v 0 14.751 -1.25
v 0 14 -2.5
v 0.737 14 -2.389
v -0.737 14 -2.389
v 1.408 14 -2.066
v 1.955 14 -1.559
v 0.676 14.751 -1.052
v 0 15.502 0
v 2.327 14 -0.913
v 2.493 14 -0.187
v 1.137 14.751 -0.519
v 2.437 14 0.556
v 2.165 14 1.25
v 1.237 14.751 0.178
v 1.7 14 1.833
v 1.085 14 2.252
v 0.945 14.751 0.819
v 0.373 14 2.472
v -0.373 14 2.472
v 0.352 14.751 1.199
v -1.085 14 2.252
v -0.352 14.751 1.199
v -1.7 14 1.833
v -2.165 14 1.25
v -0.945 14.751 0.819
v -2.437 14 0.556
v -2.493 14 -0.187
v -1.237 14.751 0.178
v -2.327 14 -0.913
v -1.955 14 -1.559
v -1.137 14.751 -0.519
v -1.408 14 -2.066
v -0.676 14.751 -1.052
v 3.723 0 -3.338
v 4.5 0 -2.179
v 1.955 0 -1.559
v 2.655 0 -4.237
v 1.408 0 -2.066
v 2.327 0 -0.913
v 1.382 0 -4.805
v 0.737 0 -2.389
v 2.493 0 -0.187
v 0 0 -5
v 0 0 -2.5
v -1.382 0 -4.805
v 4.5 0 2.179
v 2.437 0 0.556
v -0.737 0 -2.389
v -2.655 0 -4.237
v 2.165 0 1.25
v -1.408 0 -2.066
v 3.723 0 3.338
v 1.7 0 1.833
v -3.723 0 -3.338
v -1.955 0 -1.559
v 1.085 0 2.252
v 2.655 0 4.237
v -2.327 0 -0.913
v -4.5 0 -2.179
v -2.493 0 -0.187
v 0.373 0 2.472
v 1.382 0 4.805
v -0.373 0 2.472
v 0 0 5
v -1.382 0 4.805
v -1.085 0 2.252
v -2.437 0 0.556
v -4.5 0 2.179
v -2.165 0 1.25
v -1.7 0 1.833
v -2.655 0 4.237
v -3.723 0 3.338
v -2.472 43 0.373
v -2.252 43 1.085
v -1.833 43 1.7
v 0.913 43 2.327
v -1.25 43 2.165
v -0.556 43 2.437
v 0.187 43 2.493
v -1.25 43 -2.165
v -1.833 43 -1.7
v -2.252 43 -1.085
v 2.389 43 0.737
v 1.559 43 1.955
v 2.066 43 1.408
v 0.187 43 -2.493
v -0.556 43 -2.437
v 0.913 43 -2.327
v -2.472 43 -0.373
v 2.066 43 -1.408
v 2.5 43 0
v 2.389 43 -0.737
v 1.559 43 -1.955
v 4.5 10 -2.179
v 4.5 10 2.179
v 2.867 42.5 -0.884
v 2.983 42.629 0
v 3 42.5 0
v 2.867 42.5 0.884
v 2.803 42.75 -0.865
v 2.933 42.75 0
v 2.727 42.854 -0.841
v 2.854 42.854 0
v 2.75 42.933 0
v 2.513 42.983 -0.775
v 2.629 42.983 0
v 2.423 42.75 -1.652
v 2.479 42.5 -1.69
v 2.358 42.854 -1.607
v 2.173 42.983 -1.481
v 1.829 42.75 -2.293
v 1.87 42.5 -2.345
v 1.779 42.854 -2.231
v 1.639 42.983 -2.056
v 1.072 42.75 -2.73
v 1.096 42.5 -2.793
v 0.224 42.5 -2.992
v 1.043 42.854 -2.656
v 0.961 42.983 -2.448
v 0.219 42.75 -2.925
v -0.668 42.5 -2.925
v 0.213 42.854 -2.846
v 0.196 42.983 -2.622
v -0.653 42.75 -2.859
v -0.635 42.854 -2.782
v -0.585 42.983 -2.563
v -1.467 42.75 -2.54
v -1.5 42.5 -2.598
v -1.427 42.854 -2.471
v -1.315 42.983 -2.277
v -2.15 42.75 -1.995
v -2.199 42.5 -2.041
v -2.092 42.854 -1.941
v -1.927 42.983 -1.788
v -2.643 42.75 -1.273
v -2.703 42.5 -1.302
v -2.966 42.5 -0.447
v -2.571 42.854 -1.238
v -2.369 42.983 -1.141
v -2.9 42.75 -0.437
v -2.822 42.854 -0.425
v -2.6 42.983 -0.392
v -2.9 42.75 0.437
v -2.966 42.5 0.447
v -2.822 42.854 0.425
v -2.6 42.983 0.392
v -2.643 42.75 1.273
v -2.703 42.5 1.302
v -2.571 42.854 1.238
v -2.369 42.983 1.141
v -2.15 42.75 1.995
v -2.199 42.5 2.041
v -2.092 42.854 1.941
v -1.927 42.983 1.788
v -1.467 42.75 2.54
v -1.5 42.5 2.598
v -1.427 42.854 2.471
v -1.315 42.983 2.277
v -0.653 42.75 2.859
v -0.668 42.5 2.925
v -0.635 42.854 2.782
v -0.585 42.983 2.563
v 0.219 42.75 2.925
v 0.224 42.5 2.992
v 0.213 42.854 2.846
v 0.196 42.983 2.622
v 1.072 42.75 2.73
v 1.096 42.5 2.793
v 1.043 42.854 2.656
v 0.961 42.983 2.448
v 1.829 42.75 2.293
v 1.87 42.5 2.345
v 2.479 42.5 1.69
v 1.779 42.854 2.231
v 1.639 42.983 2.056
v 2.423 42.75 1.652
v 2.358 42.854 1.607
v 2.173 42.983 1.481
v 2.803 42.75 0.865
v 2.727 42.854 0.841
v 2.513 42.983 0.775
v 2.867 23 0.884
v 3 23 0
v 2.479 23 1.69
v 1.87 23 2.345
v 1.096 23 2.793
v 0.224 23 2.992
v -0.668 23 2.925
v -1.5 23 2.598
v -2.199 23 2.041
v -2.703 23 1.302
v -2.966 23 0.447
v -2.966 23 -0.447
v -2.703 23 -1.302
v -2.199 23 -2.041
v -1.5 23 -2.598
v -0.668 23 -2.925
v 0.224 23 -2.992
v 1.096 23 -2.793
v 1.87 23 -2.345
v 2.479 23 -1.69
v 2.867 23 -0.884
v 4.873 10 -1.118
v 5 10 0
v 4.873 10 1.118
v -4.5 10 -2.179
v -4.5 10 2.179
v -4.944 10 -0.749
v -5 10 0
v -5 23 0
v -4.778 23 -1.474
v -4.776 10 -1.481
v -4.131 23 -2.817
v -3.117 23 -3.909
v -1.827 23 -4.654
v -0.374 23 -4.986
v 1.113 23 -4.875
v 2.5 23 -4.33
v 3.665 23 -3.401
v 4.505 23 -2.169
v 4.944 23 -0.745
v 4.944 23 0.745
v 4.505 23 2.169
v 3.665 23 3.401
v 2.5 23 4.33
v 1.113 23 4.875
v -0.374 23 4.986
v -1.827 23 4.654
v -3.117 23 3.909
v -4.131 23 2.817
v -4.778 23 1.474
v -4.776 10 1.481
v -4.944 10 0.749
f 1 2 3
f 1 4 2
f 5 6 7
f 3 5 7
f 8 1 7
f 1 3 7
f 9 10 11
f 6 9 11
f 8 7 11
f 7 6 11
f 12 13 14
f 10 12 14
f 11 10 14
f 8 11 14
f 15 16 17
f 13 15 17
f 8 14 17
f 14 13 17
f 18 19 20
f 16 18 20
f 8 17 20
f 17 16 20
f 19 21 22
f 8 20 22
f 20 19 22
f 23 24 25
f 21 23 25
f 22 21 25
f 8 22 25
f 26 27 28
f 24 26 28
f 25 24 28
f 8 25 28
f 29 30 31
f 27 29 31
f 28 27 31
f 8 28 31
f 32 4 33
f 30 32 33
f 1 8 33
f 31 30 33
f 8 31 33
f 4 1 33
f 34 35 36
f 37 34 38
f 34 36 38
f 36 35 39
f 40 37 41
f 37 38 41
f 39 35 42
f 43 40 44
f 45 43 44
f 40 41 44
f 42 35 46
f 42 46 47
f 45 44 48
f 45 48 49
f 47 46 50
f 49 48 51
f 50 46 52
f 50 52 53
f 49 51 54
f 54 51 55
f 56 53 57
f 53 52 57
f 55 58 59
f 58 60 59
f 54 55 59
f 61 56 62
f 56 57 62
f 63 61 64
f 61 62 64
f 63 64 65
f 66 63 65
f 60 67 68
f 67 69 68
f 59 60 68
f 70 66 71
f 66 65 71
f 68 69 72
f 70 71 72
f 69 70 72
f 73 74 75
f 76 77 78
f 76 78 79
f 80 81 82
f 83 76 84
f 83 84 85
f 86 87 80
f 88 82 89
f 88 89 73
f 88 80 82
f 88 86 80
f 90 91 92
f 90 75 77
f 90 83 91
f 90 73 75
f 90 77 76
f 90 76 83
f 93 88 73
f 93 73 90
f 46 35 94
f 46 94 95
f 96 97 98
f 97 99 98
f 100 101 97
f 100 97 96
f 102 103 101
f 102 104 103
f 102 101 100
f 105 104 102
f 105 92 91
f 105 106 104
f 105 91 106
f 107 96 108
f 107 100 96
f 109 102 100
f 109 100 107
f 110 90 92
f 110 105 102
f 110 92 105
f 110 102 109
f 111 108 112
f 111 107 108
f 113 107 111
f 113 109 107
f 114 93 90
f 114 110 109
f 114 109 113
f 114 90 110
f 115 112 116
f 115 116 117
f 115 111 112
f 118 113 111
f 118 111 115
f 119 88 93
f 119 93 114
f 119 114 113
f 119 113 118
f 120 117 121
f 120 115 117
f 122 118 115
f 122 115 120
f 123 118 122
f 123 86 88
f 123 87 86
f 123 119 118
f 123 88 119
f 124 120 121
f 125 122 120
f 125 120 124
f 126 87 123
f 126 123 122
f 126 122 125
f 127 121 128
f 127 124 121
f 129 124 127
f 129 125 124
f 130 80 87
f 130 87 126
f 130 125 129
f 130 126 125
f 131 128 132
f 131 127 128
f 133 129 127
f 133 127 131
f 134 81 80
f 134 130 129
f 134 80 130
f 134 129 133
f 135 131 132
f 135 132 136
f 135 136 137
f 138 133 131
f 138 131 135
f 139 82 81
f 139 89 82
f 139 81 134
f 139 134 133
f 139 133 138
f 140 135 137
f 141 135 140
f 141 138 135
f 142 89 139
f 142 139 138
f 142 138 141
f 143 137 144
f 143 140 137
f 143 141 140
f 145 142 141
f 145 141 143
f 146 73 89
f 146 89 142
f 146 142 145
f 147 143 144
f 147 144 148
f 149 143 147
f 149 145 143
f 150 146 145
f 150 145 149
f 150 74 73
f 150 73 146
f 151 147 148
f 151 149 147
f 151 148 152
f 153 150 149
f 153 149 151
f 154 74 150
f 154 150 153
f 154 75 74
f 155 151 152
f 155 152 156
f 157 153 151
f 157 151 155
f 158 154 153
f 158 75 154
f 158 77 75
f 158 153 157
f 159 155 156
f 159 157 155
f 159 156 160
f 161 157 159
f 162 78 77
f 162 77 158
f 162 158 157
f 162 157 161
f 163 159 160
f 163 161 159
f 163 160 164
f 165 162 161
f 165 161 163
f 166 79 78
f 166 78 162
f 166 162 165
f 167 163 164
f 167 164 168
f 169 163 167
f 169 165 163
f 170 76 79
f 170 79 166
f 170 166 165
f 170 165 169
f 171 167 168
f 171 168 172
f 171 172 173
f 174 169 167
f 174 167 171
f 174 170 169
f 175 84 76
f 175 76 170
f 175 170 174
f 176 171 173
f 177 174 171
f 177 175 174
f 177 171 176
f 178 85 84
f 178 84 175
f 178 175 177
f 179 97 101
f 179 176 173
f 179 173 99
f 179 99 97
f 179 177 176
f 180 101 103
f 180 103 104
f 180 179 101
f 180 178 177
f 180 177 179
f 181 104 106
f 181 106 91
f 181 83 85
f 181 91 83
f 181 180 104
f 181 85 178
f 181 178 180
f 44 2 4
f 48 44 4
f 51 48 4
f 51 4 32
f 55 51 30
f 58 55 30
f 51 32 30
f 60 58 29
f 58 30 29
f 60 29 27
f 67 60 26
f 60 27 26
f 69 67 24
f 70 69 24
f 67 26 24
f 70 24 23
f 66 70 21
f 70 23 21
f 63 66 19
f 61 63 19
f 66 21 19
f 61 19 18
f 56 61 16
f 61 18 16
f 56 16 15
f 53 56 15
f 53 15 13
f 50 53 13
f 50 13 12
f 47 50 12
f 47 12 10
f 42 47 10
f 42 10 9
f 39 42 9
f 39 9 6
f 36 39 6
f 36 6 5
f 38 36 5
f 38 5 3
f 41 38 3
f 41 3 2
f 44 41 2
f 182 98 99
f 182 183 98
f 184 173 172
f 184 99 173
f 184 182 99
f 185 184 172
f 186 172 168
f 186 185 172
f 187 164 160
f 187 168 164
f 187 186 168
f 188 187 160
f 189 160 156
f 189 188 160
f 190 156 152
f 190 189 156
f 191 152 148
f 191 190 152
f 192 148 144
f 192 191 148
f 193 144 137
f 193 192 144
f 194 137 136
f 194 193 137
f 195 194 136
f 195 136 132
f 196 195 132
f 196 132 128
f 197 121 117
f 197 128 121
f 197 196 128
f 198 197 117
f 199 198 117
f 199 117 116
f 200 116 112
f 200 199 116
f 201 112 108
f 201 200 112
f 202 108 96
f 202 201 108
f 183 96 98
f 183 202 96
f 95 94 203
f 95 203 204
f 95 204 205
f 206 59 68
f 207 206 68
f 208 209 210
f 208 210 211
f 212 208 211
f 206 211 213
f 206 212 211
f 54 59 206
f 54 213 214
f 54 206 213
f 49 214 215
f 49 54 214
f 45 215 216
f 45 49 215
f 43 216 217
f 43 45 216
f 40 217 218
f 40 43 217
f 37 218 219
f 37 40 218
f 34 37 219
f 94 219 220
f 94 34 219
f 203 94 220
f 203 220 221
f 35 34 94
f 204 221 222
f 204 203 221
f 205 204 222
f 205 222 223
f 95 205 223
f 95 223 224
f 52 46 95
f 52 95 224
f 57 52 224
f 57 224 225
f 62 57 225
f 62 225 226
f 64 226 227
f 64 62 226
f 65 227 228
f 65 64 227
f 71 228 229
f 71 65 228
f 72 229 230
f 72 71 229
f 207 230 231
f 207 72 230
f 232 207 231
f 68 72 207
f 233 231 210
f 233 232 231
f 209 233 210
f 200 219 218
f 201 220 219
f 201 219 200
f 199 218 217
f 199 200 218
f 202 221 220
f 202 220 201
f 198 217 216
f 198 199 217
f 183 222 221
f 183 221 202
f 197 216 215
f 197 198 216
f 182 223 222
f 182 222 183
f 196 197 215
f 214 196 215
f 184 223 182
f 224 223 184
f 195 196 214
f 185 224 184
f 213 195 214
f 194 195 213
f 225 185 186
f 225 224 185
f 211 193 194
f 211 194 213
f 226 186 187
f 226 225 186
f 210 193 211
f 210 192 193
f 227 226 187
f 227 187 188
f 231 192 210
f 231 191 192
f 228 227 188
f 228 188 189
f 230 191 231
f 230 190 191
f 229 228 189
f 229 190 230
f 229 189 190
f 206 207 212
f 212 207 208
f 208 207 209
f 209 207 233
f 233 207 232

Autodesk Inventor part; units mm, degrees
ref_plane "YZ Plane" through (0, 0, 0) normal (1, 0, 0) x (0, 1, 0)
ref_plane "XZ Plane" through (0, 0, 0) normal (0, 1, 0) x (-1, 0, 0)
ref_plane "XY Plane" through (0, 0, 0) normal (0, 0, 1) x (1, 0, 0)
sketch "Sketch1" plane through (0, 0, 0) normal (0, 1, 0) x (-1, 0, 0)
  circle A0 centre (0, 0) radius 5
  dimension "d0" = 10
extrude "Extrusion1" add sketch "Sketch1" along normal blind 23
sketch "Sketch2" plane through (0, 23, 0) normal (0, 1, 0) x (1, 0, 0)
  circle A0 centre (0, 0) radius 3
  dimension "d3" = 6
extrude "Extrusion2" add sketch "Sketch2" along normal blind 20
thread "Thread1" size "M6x1" class "6g" standard "ANSI Metric M Profile" length 12
fillet "Fillet1" radius 0.5 1 edges at (-3, 43, 0)
sketch "Sketch3" plane through (0, 0, 0) normal (0, -1, 0) x (1, 0, 0)
  line L0 (4.5, 0) -> (-4.5, 0) construction
  circle A0 centre (0, 0) radius 5 projected
  line L1 (4.5, -2.1794) -> (4.5, 2.1794)
  line L2 (-4.5, -2.1794) -> (-4.5, 2.1794)
extrude "Extrusion3" cut sketch "Sketch3" against normal blind 10 contours A0 L1 | L2 A0
sketch "Sketch4" plane through (0, 0, 0) normal (0, -1, 0) x (1, 0, 0)
  line L0 (3.705, 0) -> (-3.8794, 0) construction
  point P0 (0, 0)
hole "Hole1" at (0, 0, 0) direction (0, 1, 0) diameter 5 depth 14 tip angle 118
properties part number "Semi albero F"
